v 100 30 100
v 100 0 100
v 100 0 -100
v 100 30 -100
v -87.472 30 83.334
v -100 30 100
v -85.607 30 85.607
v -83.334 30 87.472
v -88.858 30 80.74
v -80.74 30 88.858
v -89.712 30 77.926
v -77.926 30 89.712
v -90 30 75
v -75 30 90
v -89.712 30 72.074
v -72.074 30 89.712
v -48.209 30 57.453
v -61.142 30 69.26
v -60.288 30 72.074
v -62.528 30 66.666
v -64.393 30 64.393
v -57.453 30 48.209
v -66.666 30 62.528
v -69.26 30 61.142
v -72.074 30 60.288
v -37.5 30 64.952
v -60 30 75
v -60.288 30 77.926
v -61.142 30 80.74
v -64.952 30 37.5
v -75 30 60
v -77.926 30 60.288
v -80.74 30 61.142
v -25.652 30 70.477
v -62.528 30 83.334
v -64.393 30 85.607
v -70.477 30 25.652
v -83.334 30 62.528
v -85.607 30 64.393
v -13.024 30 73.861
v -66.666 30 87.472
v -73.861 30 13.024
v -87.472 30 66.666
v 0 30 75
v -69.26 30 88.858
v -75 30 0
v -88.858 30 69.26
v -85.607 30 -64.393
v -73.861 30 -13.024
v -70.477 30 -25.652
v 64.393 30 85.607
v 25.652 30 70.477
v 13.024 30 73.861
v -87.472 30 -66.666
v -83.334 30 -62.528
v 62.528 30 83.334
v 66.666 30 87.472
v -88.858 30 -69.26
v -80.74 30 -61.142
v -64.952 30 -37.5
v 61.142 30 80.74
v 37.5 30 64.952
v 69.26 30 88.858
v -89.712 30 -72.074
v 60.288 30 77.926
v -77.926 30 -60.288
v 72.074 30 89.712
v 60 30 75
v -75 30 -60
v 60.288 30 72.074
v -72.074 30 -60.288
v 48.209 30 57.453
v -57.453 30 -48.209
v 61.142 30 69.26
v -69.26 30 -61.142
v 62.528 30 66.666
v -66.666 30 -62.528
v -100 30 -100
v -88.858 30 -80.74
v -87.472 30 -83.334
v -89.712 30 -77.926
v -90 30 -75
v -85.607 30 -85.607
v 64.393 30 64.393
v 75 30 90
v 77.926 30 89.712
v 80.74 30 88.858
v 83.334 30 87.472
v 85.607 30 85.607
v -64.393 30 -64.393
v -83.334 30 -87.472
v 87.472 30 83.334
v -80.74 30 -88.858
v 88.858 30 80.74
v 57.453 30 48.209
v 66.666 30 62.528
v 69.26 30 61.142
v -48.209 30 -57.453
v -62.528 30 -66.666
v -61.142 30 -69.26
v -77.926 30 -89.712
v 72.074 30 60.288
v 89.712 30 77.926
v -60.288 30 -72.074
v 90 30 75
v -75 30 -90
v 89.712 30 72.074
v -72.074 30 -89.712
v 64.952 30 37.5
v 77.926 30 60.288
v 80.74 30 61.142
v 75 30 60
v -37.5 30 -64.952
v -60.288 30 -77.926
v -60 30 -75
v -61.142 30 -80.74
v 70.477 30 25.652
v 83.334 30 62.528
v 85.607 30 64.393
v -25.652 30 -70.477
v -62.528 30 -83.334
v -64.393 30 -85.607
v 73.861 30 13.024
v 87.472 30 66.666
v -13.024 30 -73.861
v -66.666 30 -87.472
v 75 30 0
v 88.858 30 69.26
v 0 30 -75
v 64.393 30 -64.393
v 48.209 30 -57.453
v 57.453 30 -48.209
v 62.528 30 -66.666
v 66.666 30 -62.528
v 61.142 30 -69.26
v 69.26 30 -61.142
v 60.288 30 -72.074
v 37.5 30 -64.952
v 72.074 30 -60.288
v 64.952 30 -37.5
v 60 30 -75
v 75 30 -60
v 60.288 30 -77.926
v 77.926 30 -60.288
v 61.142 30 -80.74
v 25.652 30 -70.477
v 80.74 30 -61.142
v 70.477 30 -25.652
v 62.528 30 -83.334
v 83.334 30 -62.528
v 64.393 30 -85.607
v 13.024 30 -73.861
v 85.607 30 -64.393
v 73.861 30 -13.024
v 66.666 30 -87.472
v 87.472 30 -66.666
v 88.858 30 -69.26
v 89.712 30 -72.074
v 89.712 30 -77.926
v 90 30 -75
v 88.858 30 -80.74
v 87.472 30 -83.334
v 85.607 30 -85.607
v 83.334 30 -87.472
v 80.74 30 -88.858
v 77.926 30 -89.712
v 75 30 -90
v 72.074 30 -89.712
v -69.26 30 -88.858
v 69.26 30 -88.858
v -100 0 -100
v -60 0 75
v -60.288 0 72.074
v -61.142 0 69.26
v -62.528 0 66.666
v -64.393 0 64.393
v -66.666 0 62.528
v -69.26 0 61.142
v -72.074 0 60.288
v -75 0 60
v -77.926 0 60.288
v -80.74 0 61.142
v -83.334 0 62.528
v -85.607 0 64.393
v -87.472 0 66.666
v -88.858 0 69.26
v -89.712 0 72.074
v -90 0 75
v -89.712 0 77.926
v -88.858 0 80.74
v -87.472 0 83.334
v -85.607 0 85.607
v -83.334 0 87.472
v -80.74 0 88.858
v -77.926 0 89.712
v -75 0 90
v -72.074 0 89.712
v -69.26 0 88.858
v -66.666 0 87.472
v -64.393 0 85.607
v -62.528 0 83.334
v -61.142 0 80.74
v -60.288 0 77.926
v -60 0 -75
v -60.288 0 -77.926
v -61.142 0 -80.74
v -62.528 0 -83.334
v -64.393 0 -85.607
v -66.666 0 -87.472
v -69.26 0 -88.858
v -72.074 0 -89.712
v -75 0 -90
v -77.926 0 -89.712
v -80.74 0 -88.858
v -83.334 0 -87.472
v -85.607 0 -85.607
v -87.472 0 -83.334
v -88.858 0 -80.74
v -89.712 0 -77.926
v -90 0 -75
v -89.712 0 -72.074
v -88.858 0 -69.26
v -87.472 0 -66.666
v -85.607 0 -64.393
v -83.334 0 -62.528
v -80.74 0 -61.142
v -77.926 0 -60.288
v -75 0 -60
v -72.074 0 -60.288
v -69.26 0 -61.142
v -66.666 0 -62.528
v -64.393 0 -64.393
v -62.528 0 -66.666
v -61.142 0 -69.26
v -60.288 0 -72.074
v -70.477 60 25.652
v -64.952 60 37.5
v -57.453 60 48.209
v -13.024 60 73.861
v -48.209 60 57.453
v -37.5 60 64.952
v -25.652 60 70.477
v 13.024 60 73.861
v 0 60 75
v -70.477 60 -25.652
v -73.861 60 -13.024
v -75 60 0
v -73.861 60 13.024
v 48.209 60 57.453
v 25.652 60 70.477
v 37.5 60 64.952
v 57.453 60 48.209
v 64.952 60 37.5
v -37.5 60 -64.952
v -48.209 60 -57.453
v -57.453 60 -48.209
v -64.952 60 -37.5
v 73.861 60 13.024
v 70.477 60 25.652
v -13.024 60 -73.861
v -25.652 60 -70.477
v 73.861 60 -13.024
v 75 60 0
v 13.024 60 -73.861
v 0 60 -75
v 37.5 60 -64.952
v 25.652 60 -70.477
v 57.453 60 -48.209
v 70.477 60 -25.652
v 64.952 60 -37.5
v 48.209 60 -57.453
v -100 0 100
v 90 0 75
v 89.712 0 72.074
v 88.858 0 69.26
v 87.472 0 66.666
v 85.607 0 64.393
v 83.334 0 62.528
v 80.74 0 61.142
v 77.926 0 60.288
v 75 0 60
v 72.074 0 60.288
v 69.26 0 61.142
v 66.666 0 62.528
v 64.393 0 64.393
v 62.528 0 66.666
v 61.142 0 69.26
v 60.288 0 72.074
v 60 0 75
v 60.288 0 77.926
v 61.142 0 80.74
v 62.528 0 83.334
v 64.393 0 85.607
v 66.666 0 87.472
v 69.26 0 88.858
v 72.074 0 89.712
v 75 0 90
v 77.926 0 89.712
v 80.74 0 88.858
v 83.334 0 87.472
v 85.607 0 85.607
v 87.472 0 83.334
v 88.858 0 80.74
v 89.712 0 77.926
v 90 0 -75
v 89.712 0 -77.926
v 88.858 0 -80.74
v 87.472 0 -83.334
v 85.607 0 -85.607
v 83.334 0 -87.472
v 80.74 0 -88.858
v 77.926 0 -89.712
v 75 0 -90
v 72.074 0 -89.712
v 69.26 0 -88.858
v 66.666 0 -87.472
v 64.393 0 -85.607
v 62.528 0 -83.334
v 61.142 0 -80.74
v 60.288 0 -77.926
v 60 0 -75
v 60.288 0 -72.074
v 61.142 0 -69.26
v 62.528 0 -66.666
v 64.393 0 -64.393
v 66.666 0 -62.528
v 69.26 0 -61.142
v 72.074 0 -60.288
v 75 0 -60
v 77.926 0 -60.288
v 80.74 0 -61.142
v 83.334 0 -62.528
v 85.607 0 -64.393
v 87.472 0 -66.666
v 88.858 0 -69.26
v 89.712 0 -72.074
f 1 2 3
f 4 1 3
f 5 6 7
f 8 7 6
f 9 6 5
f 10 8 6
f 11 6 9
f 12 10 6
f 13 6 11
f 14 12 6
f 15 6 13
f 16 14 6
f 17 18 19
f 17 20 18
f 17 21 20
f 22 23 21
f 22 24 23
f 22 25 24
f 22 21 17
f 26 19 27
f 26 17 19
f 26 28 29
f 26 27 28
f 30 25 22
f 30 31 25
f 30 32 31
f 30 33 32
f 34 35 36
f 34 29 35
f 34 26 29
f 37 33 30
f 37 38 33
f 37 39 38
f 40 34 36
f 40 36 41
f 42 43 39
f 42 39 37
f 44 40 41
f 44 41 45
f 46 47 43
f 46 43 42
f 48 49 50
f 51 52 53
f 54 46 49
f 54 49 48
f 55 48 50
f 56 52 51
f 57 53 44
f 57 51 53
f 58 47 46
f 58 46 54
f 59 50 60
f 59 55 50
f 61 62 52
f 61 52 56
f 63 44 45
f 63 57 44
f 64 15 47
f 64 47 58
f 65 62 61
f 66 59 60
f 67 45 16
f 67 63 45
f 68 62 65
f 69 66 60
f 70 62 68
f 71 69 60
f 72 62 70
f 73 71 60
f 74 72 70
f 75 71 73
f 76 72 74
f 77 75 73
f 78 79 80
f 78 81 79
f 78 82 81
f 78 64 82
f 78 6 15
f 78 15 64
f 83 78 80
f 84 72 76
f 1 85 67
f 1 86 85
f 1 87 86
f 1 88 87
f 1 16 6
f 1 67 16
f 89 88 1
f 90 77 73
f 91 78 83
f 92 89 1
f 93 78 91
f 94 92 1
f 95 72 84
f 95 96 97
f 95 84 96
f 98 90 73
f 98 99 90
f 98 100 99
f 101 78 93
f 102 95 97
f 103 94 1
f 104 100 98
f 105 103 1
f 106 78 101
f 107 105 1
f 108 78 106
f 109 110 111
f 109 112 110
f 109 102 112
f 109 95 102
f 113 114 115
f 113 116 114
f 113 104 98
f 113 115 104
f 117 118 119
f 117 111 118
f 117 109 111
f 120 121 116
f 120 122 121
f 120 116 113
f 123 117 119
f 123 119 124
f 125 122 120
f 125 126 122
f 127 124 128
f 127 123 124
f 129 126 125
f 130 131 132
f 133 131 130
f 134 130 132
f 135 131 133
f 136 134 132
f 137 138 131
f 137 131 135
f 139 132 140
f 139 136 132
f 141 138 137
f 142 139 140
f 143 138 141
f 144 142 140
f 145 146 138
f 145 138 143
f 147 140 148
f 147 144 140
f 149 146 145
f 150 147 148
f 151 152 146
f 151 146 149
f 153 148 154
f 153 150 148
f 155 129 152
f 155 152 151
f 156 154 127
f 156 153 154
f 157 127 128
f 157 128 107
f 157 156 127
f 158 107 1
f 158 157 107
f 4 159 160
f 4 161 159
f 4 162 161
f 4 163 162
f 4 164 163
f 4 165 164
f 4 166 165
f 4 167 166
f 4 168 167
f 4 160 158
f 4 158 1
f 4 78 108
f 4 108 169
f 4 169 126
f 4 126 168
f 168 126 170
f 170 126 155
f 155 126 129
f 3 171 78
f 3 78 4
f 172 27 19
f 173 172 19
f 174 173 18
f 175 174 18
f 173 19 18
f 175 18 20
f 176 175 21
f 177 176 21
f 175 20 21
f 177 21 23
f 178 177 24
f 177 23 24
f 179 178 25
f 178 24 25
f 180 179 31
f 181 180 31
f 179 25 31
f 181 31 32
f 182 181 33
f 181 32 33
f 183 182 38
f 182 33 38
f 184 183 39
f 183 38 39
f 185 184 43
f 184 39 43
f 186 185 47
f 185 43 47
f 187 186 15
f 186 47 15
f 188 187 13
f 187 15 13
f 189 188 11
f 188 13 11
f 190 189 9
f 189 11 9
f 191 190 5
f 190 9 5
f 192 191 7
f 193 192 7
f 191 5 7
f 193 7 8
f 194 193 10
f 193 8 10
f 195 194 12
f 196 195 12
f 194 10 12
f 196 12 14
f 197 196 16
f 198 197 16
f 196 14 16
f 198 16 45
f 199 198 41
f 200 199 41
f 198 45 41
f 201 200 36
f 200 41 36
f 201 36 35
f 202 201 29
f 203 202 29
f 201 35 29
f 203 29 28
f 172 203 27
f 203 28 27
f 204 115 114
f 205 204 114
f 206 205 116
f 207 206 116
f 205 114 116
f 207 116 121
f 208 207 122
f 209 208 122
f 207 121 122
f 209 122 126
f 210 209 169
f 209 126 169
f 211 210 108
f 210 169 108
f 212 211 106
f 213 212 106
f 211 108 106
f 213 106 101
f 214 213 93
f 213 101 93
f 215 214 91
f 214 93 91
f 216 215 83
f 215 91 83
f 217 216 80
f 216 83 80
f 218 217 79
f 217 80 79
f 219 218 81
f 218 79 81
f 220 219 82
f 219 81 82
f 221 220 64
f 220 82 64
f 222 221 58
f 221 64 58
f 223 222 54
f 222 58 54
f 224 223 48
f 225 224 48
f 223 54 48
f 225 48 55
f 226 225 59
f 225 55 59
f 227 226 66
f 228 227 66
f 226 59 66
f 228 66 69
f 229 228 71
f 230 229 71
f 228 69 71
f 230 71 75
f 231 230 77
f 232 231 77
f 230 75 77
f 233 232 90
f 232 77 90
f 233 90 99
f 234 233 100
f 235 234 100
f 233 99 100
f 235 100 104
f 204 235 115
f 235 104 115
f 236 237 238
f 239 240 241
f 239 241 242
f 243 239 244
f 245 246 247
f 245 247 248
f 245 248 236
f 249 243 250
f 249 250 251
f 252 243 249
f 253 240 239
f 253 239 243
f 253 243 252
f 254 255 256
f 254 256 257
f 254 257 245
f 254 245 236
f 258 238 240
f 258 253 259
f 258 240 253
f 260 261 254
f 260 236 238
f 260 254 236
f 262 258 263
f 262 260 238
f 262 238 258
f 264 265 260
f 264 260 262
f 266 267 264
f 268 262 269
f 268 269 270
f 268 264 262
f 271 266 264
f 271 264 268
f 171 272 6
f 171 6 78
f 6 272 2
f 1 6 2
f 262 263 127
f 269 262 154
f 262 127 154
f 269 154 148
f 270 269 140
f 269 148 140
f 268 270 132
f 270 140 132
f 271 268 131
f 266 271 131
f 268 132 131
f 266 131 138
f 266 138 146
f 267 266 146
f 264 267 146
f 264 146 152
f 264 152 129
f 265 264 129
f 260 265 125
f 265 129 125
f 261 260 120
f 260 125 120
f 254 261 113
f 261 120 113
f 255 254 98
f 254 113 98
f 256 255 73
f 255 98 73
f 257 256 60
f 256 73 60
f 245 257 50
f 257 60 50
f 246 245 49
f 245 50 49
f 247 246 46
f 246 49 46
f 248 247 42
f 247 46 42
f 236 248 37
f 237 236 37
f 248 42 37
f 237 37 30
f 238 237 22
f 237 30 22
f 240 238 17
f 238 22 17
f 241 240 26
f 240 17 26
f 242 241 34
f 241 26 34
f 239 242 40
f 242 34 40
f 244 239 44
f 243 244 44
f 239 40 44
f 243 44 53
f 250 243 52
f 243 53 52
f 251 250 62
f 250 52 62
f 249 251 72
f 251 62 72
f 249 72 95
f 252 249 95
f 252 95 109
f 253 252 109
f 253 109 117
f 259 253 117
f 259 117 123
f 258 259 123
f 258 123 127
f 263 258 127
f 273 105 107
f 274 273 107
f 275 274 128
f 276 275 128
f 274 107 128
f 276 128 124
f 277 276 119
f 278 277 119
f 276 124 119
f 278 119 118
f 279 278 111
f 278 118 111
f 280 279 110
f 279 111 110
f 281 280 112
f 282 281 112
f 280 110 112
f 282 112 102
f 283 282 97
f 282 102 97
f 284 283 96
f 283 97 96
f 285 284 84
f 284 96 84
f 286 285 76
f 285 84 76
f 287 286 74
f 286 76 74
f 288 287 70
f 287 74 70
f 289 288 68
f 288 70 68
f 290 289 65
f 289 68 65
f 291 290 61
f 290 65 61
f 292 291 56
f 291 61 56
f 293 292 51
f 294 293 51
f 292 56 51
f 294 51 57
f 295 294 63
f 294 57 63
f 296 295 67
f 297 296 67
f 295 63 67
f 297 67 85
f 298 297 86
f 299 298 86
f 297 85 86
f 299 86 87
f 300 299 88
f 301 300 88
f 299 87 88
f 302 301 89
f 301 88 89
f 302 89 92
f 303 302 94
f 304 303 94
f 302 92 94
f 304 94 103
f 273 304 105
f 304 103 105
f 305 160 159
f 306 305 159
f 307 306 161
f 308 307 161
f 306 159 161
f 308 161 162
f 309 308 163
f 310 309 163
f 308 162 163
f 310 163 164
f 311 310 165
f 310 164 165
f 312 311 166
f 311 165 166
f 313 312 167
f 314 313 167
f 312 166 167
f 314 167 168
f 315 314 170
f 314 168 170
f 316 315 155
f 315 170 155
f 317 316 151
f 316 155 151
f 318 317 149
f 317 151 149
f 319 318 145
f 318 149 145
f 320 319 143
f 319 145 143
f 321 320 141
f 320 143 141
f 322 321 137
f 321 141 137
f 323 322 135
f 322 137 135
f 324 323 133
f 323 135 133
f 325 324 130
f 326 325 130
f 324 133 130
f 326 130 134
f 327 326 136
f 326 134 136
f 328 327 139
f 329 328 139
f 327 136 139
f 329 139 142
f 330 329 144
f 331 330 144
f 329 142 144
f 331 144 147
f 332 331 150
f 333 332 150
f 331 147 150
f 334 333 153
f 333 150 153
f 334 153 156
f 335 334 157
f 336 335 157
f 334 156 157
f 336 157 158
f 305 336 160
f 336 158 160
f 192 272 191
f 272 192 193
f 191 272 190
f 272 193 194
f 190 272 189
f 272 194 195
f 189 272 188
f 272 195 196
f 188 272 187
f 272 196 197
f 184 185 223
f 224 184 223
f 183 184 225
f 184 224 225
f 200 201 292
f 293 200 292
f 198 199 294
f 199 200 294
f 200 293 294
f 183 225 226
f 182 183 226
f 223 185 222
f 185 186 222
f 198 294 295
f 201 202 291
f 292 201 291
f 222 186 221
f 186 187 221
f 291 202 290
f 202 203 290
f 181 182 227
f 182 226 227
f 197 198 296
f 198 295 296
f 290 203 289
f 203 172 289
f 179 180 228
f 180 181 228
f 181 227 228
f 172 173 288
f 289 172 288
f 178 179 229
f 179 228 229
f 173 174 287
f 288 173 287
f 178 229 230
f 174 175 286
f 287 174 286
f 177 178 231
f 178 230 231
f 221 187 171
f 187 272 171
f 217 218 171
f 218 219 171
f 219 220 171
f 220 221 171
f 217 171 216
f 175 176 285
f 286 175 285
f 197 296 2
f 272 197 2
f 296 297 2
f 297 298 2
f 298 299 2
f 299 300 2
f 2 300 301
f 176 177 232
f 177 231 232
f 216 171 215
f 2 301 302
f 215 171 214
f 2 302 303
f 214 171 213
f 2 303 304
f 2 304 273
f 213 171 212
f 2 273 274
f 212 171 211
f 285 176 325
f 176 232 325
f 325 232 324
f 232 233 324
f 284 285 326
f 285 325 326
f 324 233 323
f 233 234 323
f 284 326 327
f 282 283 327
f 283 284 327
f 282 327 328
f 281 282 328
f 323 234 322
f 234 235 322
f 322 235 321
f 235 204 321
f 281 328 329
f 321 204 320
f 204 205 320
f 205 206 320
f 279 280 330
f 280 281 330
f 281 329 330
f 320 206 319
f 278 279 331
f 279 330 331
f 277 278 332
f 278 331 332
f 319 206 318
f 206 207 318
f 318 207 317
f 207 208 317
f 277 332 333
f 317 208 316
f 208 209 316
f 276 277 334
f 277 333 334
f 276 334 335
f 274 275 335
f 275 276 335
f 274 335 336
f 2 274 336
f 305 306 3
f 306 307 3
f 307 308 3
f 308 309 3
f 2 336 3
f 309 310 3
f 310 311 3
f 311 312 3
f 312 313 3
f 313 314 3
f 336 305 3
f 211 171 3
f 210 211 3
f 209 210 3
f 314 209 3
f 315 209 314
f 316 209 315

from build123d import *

# Parameters (mm, degrees)
SKETCH1_W           = 200
SKETCH1_H           = 200
BOSS_EXTRUDE1_DEPTH = 30
SKETCH3_R           = 75
BOSS_EXTRUDE2_DEPTH = 30
SKETCH4_R           = 15
CUT_EXTRUDE1_DEPTH  = 30


with BuildPart() as part:
    # Sketch1 → Boss-Extrude1 (new body)
    with BuildSketch(Plane(origin=(0, 0, 0), x_dir=(1, 0, 0), z_dir=(0, 1, 0))):
        Rectangle(SKETCH1_W, SKETCH1_H)
    extrude(amount=BOSS_EXTRUDE1_DEPTH)

    # Sketch3 → Boss-Extrude2 (add)
    with BuildSketch(Plane(origin=(0, 30, 0), x_dir=(1, 0, 0), z_dir=(0, 1, 0))):
        Circle(SKETCH3_R)
    extrude(amount=BOSS_EXTRUDE2_DEPTH)

    # Sketch4 → Cut-Extrude1 (cut)
    with BuildSketch(Plane(origin=(0, 30, 0), x_dir=(1, 0, 0), z_dir=(0, 1, 0))):
        with Locations((-75, 75)):
            Circle(SKETCH4_R)
        with Locations((-75, -75)):
            Circle(SKETCH4_R)
        with Locations((75, 75)):
            Circle(SKETCH4_R)
        with Locations((75, -75)):
            Circle(SKETCH4_R)
    extrude(amount=-CUT_EXTRUDE1_DEPTH, mode=Mode.SUBTRACT)


solid = part.part
